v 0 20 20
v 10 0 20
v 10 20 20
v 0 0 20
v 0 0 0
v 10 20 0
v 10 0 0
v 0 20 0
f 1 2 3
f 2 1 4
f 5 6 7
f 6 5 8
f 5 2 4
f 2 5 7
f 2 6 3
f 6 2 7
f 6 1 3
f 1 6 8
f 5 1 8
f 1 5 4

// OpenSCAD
// Generated by SolidPython 0.4.6 on 2020-02-04 22:27:55


cube(size = [10, 20, 20]);
/***********************************************
*********      SolidPython code:      **********
************************************************
 
from solid import *


thermostat_case = cube([10,20,20])

scad_render_to_file(thermostat_case, 'models\\thermostat_case.scad') 
 
************************************************/
